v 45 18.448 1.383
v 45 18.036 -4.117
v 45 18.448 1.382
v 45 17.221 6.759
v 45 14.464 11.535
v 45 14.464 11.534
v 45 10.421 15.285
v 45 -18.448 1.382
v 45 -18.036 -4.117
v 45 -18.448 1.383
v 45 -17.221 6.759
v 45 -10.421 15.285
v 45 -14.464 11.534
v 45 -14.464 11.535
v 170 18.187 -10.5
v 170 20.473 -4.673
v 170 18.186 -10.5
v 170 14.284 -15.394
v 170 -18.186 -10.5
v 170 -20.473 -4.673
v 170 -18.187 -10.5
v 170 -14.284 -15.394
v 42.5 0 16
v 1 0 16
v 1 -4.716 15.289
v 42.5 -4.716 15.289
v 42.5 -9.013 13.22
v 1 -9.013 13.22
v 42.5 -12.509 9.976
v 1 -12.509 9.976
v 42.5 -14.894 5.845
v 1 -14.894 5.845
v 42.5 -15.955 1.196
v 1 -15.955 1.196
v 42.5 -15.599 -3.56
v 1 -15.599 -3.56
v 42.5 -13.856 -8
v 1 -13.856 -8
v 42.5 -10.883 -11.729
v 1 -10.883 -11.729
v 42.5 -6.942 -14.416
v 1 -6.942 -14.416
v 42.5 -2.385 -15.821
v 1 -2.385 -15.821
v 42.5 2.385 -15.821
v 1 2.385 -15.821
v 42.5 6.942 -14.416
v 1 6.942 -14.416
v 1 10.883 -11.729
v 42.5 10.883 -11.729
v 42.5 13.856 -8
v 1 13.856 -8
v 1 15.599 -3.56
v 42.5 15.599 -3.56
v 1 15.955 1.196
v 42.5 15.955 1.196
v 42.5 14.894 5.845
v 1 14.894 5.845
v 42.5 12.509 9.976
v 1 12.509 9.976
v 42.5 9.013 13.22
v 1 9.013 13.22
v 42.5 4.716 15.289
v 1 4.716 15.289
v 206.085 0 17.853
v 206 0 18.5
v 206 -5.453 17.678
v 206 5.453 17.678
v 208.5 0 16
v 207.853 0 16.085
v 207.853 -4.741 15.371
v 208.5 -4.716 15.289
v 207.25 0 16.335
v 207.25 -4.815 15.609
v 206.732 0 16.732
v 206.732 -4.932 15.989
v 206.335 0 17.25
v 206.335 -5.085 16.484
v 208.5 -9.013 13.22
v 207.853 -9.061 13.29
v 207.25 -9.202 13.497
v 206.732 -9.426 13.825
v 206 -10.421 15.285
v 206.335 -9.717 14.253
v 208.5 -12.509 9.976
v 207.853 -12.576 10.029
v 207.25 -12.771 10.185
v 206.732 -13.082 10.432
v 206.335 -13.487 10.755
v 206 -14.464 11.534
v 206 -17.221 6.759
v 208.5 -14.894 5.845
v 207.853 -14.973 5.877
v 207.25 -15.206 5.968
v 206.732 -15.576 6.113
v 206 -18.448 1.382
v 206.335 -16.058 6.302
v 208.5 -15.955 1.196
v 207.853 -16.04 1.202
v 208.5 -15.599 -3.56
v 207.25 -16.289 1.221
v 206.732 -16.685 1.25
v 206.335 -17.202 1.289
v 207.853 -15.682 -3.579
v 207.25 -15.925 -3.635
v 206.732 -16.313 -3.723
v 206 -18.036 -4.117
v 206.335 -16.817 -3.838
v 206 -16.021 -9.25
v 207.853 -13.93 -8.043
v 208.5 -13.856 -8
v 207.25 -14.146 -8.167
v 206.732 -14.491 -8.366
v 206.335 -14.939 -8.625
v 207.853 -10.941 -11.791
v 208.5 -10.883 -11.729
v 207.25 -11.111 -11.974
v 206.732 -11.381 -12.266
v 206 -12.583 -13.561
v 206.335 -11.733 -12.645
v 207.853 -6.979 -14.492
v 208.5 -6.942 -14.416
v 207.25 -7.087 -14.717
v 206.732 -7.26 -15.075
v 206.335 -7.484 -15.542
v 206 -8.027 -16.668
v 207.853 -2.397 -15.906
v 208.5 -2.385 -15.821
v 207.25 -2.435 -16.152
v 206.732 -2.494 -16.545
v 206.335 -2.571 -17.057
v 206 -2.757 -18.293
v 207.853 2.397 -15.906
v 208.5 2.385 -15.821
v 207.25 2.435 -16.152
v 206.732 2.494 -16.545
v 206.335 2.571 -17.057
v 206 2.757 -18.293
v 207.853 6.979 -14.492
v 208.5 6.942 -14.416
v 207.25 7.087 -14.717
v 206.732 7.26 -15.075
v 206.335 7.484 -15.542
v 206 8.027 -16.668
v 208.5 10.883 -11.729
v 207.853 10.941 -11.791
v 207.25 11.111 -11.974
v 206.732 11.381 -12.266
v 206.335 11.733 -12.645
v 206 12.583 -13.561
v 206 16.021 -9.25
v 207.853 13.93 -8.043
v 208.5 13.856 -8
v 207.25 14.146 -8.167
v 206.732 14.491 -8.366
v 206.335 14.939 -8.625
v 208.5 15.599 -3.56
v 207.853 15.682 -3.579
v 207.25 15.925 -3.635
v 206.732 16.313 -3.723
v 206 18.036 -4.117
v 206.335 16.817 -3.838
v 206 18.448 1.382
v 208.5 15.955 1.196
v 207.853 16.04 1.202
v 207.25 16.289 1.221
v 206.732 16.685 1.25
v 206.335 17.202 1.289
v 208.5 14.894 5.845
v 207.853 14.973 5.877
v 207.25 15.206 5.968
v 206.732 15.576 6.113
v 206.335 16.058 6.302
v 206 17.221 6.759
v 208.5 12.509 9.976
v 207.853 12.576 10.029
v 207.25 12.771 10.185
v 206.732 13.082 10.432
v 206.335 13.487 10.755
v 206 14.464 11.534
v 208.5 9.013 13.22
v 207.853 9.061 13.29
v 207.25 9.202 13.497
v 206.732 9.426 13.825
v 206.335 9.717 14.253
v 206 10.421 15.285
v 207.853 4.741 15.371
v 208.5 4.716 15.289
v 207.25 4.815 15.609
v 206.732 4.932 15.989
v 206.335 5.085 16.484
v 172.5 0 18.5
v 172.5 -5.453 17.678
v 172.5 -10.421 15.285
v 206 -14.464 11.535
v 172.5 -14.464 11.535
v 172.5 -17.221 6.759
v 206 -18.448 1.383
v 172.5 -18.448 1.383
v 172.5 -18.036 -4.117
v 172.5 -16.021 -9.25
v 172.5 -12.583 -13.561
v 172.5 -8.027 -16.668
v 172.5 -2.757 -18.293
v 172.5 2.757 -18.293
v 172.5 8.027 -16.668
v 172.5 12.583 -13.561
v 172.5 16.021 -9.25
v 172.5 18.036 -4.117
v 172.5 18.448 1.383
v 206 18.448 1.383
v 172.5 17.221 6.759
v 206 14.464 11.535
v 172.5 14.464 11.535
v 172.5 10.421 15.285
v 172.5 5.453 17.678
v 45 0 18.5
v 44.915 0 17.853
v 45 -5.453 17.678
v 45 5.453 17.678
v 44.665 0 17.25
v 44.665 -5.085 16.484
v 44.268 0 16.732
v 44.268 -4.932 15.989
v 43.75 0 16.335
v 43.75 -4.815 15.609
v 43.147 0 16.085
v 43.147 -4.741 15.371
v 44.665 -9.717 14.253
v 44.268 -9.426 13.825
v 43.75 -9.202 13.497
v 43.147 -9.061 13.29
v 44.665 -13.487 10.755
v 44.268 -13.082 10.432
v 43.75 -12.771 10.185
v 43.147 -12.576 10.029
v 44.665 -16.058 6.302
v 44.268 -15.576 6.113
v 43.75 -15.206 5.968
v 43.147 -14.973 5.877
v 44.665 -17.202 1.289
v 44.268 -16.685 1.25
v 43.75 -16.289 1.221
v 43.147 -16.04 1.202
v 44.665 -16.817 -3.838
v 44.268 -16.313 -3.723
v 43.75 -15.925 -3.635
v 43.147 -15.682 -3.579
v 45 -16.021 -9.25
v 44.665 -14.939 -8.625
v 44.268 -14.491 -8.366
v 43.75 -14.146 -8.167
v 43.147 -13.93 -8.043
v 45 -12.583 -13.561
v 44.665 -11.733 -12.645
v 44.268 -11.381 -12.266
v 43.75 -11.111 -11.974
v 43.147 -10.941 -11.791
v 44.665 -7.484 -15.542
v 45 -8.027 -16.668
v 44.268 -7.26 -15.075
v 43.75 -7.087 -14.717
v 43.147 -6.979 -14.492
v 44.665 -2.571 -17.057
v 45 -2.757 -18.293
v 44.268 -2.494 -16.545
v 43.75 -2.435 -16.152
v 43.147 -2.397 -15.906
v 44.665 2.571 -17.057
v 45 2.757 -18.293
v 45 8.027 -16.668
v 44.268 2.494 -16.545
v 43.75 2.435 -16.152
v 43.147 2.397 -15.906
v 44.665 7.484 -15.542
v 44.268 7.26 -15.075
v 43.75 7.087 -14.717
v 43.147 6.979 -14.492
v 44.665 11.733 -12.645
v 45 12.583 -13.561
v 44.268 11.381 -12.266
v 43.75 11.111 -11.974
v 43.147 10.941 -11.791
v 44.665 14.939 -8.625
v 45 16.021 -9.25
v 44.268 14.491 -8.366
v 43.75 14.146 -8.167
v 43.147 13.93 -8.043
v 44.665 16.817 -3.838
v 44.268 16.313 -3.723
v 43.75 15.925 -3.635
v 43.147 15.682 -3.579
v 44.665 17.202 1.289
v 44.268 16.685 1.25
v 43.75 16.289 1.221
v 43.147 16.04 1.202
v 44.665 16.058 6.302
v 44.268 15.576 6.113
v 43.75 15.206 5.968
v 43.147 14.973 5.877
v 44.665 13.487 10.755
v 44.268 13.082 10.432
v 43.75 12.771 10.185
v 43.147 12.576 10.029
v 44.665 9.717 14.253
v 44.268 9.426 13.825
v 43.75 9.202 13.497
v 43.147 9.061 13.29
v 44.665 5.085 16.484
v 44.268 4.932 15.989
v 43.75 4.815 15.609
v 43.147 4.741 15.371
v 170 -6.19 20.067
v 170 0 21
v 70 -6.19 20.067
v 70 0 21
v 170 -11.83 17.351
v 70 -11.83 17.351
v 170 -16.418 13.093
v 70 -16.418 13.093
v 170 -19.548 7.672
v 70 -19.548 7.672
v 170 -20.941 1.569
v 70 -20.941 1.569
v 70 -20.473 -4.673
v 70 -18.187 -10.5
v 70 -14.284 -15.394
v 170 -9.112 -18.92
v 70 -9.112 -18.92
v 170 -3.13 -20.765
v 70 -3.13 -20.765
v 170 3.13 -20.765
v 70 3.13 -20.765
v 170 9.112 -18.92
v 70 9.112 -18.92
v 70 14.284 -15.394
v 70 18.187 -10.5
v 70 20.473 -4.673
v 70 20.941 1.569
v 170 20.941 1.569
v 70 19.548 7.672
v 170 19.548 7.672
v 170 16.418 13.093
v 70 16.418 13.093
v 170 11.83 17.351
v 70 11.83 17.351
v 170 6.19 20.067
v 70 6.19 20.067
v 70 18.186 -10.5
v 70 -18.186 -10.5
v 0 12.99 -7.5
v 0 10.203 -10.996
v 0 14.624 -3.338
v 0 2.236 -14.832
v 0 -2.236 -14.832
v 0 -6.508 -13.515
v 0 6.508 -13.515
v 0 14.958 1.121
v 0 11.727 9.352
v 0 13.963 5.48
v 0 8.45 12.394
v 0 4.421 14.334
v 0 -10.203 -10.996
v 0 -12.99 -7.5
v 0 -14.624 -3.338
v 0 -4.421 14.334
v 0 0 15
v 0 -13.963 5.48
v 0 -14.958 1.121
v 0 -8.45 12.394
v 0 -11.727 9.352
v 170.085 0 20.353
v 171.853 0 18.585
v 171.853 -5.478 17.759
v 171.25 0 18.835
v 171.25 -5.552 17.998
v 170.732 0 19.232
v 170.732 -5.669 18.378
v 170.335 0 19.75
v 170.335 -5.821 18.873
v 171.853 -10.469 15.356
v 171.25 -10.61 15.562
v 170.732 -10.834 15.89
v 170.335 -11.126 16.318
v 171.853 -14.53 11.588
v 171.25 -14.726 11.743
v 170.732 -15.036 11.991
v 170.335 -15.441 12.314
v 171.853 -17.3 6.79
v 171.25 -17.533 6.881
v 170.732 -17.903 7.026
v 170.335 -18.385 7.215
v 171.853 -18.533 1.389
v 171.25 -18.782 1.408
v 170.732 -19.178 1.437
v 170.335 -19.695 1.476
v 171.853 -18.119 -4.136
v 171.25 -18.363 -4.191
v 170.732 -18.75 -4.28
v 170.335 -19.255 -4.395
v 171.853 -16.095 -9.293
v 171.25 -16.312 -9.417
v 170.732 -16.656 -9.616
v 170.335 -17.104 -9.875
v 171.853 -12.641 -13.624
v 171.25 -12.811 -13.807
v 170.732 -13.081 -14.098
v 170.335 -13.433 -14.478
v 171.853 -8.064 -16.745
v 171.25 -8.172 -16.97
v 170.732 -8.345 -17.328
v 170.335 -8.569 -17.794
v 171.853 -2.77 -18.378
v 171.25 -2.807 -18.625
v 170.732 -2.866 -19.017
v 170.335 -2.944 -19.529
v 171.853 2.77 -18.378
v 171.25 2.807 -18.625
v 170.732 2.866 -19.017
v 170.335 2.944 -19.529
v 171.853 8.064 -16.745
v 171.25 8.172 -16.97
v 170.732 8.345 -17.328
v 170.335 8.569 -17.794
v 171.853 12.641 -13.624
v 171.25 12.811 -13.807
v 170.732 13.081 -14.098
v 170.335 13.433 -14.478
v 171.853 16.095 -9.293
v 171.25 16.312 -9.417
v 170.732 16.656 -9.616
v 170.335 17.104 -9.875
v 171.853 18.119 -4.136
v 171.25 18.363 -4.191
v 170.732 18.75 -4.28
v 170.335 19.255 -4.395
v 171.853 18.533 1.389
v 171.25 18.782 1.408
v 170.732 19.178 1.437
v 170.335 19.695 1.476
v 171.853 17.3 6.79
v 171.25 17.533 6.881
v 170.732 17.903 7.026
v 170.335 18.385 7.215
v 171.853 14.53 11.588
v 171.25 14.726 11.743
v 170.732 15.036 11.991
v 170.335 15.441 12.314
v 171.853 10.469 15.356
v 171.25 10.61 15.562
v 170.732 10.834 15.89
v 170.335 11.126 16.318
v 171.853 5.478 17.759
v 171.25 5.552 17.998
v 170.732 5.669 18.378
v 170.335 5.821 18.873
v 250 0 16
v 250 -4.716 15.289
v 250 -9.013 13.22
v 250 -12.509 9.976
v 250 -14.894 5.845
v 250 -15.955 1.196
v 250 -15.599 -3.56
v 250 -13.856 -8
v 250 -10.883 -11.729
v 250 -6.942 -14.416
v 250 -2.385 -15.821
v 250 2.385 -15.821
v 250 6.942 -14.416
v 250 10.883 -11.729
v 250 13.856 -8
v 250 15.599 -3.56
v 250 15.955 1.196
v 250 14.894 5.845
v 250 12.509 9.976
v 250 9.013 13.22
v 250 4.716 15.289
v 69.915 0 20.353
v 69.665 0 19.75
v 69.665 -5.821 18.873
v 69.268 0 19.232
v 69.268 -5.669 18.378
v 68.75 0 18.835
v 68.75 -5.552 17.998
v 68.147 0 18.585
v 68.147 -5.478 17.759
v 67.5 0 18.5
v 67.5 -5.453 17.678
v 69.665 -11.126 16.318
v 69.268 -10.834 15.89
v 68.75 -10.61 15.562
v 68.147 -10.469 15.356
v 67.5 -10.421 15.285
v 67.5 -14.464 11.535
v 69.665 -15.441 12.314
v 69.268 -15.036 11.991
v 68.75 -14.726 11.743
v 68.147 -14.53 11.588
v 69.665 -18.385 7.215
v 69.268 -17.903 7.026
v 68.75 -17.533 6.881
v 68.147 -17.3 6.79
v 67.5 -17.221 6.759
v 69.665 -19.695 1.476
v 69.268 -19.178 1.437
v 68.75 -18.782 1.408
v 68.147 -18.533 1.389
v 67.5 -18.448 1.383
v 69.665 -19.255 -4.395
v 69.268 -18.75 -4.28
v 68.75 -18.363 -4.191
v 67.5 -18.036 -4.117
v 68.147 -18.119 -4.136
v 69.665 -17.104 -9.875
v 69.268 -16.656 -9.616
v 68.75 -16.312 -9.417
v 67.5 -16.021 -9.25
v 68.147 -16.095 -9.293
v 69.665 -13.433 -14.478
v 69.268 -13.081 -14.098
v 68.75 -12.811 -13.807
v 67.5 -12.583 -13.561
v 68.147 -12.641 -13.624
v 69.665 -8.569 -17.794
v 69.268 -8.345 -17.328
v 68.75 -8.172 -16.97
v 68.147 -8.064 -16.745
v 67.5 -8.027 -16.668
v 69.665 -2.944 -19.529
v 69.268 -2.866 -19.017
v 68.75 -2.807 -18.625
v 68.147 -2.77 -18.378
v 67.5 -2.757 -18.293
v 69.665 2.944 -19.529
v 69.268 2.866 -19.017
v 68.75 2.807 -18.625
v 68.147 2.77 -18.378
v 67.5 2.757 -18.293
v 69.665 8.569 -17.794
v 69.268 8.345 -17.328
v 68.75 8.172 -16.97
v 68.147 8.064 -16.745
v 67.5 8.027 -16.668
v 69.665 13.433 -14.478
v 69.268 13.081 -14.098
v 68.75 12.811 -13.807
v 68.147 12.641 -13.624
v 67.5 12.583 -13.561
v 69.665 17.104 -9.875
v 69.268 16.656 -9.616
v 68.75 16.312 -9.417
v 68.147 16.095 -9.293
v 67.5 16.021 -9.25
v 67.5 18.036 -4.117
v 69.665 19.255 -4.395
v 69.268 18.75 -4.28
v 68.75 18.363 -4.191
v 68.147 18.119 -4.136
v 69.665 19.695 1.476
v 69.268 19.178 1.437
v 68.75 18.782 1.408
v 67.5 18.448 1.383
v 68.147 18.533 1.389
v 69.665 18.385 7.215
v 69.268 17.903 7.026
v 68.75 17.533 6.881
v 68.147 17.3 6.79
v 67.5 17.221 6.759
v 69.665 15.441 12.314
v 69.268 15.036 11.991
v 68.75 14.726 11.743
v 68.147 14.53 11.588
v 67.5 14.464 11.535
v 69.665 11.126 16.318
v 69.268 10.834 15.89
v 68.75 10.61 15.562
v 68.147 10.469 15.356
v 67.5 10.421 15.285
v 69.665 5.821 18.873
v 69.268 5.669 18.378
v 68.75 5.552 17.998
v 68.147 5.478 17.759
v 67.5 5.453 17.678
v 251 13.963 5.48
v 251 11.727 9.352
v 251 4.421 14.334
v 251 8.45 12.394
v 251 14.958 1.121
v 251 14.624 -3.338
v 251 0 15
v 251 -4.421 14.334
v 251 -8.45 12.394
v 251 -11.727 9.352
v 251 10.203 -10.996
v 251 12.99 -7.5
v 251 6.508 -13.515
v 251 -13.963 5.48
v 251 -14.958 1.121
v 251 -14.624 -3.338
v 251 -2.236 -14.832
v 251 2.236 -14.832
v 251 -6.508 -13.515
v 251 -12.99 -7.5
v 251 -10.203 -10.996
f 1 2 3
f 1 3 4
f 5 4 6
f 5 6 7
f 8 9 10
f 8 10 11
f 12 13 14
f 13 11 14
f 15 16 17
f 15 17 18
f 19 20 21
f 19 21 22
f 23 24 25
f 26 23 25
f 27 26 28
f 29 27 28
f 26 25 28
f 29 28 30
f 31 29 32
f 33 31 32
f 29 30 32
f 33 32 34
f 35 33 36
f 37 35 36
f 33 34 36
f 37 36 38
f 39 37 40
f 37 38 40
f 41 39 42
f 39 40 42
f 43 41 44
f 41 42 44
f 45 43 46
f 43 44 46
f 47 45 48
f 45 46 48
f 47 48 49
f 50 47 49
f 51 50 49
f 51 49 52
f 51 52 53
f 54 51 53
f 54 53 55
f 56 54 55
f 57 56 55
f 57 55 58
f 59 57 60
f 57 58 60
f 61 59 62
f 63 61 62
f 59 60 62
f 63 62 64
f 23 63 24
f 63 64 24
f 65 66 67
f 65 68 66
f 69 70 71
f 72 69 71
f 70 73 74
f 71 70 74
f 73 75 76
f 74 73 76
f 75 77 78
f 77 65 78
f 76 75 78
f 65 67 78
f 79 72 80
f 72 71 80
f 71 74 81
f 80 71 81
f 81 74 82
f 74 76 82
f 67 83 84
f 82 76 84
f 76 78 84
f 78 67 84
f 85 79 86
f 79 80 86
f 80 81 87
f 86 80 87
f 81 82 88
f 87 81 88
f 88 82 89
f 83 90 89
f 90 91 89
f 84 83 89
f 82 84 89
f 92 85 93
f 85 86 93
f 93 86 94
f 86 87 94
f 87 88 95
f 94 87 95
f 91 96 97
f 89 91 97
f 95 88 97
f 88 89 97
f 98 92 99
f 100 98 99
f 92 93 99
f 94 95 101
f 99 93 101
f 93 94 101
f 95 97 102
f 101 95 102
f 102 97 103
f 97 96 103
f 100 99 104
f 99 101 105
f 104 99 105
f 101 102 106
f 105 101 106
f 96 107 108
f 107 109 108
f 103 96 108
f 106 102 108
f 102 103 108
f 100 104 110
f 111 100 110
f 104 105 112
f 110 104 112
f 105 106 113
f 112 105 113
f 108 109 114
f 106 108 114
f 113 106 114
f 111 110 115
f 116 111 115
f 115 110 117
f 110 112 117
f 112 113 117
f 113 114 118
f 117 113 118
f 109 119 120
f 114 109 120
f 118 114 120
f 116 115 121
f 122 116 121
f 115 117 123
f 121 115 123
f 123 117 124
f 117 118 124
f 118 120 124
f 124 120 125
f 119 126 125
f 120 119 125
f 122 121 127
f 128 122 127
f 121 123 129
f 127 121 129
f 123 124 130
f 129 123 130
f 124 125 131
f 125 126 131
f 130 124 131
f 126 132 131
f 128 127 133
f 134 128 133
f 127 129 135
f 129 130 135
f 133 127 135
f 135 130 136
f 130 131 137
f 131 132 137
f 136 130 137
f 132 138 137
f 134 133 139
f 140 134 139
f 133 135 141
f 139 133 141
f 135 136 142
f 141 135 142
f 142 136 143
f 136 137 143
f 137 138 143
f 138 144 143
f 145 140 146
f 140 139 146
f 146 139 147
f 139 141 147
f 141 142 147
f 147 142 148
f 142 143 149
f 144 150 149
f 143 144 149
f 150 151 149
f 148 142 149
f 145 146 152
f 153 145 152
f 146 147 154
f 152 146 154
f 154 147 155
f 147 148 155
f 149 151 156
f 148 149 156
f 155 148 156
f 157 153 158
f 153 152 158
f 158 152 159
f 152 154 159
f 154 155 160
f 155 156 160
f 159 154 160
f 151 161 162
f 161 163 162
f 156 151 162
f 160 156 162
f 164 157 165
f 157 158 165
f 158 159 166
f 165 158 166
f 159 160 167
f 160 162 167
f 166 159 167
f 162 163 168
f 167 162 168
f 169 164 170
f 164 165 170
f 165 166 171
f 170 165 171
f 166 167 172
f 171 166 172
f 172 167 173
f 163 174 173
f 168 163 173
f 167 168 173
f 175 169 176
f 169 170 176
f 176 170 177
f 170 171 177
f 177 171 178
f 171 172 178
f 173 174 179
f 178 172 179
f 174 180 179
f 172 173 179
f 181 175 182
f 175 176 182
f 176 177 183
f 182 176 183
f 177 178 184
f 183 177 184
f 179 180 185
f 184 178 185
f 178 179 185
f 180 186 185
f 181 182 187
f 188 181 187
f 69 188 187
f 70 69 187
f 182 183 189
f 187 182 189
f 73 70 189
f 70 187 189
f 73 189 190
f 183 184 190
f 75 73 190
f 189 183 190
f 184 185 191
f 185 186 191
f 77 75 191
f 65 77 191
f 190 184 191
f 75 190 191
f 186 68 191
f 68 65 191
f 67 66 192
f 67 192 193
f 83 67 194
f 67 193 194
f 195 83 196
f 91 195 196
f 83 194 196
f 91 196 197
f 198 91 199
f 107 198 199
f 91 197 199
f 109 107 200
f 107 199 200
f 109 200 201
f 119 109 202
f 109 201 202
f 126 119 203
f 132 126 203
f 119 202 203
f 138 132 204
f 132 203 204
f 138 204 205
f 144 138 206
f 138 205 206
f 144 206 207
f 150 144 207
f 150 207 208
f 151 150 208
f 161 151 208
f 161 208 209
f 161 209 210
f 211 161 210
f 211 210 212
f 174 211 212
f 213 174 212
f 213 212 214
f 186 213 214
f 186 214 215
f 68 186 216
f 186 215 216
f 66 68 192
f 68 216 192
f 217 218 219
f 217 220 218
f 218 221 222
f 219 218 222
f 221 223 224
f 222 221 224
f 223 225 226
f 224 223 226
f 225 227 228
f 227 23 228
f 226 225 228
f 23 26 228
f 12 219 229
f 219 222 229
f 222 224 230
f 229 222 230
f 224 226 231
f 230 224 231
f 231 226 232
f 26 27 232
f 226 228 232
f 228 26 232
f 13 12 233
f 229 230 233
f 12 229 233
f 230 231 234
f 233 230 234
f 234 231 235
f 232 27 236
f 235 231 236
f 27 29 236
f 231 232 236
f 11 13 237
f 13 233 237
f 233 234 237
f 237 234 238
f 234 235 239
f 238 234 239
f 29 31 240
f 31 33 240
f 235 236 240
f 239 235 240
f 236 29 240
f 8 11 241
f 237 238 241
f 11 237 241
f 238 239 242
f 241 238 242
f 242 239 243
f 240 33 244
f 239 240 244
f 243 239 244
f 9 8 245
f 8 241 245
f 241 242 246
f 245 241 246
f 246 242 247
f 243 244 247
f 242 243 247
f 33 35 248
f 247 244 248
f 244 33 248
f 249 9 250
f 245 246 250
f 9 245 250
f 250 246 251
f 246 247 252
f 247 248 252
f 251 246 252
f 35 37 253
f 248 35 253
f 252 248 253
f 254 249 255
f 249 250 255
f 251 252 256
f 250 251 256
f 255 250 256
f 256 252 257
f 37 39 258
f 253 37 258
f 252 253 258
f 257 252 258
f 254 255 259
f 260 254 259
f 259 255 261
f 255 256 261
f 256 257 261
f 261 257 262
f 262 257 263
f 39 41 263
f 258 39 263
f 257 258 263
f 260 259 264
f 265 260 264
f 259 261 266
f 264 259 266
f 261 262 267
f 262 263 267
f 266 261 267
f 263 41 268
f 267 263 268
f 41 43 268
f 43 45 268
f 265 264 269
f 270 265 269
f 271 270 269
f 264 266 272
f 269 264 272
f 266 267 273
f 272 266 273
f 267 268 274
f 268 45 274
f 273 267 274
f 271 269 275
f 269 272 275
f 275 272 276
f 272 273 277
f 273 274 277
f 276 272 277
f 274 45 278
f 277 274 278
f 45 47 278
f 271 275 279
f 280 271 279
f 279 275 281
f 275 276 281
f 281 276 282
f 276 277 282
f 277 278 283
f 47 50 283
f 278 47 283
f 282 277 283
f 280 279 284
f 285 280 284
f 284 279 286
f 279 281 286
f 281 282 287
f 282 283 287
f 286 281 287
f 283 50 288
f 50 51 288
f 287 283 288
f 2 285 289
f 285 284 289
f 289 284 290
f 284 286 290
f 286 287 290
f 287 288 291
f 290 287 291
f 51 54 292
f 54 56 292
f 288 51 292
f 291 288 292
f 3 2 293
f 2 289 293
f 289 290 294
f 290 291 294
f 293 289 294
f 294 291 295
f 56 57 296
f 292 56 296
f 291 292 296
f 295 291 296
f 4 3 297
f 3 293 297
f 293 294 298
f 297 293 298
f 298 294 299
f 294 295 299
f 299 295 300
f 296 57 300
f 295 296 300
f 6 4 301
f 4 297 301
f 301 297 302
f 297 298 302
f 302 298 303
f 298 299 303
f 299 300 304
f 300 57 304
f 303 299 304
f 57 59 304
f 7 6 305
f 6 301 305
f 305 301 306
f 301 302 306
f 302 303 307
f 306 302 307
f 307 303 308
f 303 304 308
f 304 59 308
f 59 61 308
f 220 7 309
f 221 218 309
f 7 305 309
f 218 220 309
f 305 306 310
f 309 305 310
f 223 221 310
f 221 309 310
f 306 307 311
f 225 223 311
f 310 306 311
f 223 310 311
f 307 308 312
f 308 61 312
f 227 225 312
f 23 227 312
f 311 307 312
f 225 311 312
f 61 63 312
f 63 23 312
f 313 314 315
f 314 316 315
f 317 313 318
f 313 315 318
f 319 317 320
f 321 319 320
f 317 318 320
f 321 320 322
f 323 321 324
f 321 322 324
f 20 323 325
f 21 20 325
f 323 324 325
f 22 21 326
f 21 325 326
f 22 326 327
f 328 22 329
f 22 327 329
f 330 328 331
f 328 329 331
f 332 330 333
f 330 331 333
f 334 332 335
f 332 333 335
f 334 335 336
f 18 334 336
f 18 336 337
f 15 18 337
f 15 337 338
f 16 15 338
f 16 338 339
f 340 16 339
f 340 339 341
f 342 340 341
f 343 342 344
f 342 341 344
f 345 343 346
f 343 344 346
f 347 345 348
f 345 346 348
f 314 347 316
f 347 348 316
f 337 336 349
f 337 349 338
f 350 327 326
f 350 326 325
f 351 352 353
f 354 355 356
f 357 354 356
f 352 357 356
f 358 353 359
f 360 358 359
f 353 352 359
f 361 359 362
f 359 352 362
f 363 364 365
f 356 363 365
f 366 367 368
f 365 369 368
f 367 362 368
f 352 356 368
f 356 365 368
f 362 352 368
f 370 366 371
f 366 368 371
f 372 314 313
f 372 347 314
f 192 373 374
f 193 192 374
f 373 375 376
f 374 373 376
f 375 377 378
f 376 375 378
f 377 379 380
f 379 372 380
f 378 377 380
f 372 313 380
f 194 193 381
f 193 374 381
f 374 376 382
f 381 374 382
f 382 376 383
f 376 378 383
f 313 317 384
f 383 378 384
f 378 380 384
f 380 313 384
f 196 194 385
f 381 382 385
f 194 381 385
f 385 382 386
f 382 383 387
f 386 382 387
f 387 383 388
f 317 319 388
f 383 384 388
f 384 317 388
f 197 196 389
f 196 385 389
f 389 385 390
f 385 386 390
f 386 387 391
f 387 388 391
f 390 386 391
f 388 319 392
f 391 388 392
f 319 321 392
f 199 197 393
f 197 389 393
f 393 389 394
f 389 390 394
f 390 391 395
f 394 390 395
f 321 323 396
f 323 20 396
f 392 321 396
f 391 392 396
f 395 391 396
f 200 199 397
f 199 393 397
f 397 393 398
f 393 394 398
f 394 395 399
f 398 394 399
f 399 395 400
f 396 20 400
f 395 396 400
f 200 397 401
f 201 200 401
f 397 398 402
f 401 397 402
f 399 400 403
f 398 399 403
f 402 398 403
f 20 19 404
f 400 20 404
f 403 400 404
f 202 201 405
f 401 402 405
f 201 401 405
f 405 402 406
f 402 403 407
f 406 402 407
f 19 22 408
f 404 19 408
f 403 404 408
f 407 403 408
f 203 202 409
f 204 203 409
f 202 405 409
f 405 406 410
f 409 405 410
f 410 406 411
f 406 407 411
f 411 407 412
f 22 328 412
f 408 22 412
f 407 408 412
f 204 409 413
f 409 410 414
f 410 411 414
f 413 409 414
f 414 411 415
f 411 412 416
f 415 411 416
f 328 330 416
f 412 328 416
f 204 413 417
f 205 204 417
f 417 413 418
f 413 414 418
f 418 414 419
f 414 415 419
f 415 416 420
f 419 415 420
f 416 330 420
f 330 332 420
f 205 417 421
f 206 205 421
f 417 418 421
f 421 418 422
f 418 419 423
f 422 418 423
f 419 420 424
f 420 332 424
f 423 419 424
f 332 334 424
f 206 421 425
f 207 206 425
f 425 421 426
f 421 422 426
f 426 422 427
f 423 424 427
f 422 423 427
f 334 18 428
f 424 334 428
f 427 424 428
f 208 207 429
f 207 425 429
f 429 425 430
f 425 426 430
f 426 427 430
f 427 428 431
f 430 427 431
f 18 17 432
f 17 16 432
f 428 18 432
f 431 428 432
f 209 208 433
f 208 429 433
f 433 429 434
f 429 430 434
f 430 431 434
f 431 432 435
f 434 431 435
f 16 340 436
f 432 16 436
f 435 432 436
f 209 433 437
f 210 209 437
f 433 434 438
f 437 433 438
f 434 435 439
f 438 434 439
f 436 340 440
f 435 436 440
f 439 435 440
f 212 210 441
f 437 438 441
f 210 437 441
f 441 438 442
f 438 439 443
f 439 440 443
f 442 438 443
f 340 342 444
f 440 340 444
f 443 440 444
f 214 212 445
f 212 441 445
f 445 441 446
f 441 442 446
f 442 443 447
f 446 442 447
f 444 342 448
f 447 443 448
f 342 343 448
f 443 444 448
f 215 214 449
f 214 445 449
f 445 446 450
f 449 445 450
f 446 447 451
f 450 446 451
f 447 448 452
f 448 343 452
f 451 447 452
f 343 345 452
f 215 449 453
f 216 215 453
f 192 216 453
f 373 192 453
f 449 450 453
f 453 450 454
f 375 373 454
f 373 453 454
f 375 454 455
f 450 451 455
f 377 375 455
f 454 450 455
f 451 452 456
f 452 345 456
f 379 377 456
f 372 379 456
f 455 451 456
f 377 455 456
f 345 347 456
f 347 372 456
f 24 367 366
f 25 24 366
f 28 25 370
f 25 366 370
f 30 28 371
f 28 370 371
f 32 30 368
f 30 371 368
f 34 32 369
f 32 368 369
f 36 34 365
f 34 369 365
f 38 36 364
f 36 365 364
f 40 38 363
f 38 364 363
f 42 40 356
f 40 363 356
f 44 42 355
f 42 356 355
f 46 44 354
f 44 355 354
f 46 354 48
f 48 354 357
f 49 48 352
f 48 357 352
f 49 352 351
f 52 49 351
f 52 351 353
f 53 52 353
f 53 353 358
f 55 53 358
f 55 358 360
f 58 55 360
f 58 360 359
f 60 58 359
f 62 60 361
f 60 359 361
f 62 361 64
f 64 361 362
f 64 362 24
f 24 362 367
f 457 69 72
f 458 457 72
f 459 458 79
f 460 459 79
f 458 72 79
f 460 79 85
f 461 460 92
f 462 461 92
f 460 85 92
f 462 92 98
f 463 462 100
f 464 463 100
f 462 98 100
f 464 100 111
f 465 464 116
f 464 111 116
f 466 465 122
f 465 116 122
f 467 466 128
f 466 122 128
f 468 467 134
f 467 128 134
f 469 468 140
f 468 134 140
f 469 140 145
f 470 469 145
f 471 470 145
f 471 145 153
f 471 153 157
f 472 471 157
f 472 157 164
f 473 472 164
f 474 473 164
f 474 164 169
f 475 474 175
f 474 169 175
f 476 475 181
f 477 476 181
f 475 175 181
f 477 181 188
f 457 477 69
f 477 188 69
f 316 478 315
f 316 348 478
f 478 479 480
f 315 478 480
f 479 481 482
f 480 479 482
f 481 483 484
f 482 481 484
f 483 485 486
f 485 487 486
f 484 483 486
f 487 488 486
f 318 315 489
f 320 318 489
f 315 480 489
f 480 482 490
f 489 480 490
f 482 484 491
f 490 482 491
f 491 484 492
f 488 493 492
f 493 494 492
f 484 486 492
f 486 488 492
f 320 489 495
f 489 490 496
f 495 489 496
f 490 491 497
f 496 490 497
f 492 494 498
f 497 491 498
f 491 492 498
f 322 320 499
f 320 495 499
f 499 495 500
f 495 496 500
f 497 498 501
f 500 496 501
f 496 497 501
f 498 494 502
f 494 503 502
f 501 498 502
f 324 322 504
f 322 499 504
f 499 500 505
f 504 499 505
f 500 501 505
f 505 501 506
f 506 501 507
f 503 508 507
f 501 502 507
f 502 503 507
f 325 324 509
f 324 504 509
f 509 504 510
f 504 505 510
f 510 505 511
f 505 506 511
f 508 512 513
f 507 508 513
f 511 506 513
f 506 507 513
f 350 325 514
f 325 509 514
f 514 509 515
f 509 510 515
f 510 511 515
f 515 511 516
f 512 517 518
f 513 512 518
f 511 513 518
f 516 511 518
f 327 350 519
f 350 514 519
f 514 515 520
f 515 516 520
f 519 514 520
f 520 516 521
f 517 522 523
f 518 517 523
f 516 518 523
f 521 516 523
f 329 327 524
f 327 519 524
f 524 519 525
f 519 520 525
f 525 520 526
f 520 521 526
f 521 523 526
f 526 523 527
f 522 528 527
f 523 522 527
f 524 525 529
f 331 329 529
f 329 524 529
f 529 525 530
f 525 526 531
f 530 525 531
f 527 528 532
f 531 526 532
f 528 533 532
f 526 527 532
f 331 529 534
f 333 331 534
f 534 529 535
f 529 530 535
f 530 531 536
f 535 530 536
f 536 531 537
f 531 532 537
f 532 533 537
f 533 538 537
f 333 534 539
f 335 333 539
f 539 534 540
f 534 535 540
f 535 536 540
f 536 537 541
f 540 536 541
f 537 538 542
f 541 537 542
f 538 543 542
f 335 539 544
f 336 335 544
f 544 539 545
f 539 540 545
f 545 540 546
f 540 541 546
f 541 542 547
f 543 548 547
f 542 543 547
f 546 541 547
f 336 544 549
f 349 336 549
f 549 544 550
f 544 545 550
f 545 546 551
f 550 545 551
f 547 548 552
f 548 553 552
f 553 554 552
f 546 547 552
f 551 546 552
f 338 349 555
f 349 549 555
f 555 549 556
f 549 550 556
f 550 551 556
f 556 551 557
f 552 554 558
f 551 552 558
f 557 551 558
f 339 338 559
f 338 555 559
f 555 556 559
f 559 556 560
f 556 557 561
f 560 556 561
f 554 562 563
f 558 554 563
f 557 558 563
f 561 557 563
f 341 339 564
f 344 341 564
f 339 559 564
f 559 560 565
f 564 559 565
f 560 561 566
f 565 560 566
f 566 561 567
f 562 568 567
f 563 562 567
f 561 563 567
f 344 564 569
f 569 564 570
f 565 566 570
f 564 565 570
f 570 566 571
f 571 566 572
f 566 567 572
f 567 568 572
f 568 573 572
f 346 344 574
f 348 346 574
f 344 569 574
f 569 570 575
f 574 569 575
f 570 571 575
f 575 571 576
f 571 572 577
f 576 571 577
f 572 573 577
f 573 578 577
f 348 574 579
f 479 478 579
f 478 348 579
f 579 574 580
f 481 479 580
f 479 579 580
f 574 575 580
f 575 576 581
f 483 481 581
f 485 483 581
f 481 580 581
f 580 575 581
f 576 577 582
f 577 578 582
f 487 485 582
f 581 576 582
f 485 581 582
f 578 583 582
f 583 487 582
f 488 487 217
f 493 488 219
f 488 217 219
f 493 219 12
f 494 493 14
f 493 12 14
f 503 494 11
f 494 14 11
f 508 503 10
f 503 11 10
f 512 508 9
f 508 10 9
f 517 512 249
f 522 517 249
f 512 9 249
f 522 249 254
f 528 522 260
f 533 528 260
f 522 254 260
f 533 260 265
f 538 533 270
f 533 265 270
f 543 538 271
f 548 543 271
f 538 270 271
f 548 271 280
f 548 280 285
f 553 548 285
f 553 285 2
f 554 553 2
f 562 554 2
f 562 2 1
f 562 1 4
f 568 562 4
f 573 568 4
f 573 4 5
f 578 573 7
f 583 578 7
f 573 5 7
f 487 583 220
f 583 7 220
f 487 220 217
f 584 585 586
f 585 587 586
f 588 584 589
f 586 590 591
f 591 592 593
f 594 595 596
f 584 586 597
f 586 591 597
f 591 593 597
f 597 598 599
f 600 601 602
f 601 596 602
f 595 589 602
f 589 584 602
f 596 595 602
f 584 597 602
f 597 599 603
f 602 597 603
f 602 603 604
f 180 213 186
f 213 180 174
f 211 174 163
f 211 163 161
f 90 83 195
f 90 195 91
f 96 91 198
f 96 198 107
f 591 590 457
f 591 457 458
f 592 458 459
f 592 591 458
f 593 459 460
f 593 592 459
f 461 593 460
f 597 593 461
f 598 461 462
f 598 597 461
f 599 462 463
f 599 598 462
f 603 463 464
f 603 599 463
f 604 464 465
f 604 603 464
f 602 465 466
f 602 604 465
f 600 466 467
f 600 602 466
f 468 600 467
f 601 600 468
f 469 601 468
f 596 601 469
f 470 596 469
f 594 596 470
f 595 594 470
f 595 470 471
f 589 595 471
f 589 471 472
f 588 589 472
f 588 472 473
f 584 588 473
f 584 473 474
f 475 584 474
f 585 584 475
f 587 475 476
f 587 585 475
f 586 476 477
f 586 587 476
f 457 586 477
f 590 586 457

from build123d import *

# Parameters (mm, degrees)
FILLET1_R     = 2.5
CHAMFER1_SIZE = 1


with BuildPart() as part:
    # Sketch1 → Revolve1 (revolve)
    with BuildSketch(Plane.XY, mode=Mode.PRIVATE) as revolve1_sk:
        Polygon((0, 0), (251, 0), (251, 16), (206, 16), (206, 18.5), (170, 18.5), (170, 21), (70, 21), (70, 18.5), (45, 18.5), (45, 16), (0, 16), align=None)
    revolve(revolve1_sk.sketch.rotate(Axis((0, 0, 0), (1, 0, 0)), 90), axis=Axis((0, 0, 0), (1, 0, 0)))

    # Fillet1
    fillet1_edges = [part.edges().sort_by_distance(p)[0] for p in [
        (170, 0, -18.5),
        (70, 0, -18.5),
        (45, 0, -16),
        (206, 0, -16),
    ]]
    fillet(fillet1_edges, radius=FILLET1_R - 0.0001)  # a hair under: the kernel refuses the full size

    # Chamfer1
    chamfer1_edges = [part.edges().sort_by_distance(p)[0] for p in [
        (0, 0, -16),
        (251, 0, -16),
    ]]
    chamfer(chamfer1_edges, length=CHAMFER1_SIZE)


solid = part.part
